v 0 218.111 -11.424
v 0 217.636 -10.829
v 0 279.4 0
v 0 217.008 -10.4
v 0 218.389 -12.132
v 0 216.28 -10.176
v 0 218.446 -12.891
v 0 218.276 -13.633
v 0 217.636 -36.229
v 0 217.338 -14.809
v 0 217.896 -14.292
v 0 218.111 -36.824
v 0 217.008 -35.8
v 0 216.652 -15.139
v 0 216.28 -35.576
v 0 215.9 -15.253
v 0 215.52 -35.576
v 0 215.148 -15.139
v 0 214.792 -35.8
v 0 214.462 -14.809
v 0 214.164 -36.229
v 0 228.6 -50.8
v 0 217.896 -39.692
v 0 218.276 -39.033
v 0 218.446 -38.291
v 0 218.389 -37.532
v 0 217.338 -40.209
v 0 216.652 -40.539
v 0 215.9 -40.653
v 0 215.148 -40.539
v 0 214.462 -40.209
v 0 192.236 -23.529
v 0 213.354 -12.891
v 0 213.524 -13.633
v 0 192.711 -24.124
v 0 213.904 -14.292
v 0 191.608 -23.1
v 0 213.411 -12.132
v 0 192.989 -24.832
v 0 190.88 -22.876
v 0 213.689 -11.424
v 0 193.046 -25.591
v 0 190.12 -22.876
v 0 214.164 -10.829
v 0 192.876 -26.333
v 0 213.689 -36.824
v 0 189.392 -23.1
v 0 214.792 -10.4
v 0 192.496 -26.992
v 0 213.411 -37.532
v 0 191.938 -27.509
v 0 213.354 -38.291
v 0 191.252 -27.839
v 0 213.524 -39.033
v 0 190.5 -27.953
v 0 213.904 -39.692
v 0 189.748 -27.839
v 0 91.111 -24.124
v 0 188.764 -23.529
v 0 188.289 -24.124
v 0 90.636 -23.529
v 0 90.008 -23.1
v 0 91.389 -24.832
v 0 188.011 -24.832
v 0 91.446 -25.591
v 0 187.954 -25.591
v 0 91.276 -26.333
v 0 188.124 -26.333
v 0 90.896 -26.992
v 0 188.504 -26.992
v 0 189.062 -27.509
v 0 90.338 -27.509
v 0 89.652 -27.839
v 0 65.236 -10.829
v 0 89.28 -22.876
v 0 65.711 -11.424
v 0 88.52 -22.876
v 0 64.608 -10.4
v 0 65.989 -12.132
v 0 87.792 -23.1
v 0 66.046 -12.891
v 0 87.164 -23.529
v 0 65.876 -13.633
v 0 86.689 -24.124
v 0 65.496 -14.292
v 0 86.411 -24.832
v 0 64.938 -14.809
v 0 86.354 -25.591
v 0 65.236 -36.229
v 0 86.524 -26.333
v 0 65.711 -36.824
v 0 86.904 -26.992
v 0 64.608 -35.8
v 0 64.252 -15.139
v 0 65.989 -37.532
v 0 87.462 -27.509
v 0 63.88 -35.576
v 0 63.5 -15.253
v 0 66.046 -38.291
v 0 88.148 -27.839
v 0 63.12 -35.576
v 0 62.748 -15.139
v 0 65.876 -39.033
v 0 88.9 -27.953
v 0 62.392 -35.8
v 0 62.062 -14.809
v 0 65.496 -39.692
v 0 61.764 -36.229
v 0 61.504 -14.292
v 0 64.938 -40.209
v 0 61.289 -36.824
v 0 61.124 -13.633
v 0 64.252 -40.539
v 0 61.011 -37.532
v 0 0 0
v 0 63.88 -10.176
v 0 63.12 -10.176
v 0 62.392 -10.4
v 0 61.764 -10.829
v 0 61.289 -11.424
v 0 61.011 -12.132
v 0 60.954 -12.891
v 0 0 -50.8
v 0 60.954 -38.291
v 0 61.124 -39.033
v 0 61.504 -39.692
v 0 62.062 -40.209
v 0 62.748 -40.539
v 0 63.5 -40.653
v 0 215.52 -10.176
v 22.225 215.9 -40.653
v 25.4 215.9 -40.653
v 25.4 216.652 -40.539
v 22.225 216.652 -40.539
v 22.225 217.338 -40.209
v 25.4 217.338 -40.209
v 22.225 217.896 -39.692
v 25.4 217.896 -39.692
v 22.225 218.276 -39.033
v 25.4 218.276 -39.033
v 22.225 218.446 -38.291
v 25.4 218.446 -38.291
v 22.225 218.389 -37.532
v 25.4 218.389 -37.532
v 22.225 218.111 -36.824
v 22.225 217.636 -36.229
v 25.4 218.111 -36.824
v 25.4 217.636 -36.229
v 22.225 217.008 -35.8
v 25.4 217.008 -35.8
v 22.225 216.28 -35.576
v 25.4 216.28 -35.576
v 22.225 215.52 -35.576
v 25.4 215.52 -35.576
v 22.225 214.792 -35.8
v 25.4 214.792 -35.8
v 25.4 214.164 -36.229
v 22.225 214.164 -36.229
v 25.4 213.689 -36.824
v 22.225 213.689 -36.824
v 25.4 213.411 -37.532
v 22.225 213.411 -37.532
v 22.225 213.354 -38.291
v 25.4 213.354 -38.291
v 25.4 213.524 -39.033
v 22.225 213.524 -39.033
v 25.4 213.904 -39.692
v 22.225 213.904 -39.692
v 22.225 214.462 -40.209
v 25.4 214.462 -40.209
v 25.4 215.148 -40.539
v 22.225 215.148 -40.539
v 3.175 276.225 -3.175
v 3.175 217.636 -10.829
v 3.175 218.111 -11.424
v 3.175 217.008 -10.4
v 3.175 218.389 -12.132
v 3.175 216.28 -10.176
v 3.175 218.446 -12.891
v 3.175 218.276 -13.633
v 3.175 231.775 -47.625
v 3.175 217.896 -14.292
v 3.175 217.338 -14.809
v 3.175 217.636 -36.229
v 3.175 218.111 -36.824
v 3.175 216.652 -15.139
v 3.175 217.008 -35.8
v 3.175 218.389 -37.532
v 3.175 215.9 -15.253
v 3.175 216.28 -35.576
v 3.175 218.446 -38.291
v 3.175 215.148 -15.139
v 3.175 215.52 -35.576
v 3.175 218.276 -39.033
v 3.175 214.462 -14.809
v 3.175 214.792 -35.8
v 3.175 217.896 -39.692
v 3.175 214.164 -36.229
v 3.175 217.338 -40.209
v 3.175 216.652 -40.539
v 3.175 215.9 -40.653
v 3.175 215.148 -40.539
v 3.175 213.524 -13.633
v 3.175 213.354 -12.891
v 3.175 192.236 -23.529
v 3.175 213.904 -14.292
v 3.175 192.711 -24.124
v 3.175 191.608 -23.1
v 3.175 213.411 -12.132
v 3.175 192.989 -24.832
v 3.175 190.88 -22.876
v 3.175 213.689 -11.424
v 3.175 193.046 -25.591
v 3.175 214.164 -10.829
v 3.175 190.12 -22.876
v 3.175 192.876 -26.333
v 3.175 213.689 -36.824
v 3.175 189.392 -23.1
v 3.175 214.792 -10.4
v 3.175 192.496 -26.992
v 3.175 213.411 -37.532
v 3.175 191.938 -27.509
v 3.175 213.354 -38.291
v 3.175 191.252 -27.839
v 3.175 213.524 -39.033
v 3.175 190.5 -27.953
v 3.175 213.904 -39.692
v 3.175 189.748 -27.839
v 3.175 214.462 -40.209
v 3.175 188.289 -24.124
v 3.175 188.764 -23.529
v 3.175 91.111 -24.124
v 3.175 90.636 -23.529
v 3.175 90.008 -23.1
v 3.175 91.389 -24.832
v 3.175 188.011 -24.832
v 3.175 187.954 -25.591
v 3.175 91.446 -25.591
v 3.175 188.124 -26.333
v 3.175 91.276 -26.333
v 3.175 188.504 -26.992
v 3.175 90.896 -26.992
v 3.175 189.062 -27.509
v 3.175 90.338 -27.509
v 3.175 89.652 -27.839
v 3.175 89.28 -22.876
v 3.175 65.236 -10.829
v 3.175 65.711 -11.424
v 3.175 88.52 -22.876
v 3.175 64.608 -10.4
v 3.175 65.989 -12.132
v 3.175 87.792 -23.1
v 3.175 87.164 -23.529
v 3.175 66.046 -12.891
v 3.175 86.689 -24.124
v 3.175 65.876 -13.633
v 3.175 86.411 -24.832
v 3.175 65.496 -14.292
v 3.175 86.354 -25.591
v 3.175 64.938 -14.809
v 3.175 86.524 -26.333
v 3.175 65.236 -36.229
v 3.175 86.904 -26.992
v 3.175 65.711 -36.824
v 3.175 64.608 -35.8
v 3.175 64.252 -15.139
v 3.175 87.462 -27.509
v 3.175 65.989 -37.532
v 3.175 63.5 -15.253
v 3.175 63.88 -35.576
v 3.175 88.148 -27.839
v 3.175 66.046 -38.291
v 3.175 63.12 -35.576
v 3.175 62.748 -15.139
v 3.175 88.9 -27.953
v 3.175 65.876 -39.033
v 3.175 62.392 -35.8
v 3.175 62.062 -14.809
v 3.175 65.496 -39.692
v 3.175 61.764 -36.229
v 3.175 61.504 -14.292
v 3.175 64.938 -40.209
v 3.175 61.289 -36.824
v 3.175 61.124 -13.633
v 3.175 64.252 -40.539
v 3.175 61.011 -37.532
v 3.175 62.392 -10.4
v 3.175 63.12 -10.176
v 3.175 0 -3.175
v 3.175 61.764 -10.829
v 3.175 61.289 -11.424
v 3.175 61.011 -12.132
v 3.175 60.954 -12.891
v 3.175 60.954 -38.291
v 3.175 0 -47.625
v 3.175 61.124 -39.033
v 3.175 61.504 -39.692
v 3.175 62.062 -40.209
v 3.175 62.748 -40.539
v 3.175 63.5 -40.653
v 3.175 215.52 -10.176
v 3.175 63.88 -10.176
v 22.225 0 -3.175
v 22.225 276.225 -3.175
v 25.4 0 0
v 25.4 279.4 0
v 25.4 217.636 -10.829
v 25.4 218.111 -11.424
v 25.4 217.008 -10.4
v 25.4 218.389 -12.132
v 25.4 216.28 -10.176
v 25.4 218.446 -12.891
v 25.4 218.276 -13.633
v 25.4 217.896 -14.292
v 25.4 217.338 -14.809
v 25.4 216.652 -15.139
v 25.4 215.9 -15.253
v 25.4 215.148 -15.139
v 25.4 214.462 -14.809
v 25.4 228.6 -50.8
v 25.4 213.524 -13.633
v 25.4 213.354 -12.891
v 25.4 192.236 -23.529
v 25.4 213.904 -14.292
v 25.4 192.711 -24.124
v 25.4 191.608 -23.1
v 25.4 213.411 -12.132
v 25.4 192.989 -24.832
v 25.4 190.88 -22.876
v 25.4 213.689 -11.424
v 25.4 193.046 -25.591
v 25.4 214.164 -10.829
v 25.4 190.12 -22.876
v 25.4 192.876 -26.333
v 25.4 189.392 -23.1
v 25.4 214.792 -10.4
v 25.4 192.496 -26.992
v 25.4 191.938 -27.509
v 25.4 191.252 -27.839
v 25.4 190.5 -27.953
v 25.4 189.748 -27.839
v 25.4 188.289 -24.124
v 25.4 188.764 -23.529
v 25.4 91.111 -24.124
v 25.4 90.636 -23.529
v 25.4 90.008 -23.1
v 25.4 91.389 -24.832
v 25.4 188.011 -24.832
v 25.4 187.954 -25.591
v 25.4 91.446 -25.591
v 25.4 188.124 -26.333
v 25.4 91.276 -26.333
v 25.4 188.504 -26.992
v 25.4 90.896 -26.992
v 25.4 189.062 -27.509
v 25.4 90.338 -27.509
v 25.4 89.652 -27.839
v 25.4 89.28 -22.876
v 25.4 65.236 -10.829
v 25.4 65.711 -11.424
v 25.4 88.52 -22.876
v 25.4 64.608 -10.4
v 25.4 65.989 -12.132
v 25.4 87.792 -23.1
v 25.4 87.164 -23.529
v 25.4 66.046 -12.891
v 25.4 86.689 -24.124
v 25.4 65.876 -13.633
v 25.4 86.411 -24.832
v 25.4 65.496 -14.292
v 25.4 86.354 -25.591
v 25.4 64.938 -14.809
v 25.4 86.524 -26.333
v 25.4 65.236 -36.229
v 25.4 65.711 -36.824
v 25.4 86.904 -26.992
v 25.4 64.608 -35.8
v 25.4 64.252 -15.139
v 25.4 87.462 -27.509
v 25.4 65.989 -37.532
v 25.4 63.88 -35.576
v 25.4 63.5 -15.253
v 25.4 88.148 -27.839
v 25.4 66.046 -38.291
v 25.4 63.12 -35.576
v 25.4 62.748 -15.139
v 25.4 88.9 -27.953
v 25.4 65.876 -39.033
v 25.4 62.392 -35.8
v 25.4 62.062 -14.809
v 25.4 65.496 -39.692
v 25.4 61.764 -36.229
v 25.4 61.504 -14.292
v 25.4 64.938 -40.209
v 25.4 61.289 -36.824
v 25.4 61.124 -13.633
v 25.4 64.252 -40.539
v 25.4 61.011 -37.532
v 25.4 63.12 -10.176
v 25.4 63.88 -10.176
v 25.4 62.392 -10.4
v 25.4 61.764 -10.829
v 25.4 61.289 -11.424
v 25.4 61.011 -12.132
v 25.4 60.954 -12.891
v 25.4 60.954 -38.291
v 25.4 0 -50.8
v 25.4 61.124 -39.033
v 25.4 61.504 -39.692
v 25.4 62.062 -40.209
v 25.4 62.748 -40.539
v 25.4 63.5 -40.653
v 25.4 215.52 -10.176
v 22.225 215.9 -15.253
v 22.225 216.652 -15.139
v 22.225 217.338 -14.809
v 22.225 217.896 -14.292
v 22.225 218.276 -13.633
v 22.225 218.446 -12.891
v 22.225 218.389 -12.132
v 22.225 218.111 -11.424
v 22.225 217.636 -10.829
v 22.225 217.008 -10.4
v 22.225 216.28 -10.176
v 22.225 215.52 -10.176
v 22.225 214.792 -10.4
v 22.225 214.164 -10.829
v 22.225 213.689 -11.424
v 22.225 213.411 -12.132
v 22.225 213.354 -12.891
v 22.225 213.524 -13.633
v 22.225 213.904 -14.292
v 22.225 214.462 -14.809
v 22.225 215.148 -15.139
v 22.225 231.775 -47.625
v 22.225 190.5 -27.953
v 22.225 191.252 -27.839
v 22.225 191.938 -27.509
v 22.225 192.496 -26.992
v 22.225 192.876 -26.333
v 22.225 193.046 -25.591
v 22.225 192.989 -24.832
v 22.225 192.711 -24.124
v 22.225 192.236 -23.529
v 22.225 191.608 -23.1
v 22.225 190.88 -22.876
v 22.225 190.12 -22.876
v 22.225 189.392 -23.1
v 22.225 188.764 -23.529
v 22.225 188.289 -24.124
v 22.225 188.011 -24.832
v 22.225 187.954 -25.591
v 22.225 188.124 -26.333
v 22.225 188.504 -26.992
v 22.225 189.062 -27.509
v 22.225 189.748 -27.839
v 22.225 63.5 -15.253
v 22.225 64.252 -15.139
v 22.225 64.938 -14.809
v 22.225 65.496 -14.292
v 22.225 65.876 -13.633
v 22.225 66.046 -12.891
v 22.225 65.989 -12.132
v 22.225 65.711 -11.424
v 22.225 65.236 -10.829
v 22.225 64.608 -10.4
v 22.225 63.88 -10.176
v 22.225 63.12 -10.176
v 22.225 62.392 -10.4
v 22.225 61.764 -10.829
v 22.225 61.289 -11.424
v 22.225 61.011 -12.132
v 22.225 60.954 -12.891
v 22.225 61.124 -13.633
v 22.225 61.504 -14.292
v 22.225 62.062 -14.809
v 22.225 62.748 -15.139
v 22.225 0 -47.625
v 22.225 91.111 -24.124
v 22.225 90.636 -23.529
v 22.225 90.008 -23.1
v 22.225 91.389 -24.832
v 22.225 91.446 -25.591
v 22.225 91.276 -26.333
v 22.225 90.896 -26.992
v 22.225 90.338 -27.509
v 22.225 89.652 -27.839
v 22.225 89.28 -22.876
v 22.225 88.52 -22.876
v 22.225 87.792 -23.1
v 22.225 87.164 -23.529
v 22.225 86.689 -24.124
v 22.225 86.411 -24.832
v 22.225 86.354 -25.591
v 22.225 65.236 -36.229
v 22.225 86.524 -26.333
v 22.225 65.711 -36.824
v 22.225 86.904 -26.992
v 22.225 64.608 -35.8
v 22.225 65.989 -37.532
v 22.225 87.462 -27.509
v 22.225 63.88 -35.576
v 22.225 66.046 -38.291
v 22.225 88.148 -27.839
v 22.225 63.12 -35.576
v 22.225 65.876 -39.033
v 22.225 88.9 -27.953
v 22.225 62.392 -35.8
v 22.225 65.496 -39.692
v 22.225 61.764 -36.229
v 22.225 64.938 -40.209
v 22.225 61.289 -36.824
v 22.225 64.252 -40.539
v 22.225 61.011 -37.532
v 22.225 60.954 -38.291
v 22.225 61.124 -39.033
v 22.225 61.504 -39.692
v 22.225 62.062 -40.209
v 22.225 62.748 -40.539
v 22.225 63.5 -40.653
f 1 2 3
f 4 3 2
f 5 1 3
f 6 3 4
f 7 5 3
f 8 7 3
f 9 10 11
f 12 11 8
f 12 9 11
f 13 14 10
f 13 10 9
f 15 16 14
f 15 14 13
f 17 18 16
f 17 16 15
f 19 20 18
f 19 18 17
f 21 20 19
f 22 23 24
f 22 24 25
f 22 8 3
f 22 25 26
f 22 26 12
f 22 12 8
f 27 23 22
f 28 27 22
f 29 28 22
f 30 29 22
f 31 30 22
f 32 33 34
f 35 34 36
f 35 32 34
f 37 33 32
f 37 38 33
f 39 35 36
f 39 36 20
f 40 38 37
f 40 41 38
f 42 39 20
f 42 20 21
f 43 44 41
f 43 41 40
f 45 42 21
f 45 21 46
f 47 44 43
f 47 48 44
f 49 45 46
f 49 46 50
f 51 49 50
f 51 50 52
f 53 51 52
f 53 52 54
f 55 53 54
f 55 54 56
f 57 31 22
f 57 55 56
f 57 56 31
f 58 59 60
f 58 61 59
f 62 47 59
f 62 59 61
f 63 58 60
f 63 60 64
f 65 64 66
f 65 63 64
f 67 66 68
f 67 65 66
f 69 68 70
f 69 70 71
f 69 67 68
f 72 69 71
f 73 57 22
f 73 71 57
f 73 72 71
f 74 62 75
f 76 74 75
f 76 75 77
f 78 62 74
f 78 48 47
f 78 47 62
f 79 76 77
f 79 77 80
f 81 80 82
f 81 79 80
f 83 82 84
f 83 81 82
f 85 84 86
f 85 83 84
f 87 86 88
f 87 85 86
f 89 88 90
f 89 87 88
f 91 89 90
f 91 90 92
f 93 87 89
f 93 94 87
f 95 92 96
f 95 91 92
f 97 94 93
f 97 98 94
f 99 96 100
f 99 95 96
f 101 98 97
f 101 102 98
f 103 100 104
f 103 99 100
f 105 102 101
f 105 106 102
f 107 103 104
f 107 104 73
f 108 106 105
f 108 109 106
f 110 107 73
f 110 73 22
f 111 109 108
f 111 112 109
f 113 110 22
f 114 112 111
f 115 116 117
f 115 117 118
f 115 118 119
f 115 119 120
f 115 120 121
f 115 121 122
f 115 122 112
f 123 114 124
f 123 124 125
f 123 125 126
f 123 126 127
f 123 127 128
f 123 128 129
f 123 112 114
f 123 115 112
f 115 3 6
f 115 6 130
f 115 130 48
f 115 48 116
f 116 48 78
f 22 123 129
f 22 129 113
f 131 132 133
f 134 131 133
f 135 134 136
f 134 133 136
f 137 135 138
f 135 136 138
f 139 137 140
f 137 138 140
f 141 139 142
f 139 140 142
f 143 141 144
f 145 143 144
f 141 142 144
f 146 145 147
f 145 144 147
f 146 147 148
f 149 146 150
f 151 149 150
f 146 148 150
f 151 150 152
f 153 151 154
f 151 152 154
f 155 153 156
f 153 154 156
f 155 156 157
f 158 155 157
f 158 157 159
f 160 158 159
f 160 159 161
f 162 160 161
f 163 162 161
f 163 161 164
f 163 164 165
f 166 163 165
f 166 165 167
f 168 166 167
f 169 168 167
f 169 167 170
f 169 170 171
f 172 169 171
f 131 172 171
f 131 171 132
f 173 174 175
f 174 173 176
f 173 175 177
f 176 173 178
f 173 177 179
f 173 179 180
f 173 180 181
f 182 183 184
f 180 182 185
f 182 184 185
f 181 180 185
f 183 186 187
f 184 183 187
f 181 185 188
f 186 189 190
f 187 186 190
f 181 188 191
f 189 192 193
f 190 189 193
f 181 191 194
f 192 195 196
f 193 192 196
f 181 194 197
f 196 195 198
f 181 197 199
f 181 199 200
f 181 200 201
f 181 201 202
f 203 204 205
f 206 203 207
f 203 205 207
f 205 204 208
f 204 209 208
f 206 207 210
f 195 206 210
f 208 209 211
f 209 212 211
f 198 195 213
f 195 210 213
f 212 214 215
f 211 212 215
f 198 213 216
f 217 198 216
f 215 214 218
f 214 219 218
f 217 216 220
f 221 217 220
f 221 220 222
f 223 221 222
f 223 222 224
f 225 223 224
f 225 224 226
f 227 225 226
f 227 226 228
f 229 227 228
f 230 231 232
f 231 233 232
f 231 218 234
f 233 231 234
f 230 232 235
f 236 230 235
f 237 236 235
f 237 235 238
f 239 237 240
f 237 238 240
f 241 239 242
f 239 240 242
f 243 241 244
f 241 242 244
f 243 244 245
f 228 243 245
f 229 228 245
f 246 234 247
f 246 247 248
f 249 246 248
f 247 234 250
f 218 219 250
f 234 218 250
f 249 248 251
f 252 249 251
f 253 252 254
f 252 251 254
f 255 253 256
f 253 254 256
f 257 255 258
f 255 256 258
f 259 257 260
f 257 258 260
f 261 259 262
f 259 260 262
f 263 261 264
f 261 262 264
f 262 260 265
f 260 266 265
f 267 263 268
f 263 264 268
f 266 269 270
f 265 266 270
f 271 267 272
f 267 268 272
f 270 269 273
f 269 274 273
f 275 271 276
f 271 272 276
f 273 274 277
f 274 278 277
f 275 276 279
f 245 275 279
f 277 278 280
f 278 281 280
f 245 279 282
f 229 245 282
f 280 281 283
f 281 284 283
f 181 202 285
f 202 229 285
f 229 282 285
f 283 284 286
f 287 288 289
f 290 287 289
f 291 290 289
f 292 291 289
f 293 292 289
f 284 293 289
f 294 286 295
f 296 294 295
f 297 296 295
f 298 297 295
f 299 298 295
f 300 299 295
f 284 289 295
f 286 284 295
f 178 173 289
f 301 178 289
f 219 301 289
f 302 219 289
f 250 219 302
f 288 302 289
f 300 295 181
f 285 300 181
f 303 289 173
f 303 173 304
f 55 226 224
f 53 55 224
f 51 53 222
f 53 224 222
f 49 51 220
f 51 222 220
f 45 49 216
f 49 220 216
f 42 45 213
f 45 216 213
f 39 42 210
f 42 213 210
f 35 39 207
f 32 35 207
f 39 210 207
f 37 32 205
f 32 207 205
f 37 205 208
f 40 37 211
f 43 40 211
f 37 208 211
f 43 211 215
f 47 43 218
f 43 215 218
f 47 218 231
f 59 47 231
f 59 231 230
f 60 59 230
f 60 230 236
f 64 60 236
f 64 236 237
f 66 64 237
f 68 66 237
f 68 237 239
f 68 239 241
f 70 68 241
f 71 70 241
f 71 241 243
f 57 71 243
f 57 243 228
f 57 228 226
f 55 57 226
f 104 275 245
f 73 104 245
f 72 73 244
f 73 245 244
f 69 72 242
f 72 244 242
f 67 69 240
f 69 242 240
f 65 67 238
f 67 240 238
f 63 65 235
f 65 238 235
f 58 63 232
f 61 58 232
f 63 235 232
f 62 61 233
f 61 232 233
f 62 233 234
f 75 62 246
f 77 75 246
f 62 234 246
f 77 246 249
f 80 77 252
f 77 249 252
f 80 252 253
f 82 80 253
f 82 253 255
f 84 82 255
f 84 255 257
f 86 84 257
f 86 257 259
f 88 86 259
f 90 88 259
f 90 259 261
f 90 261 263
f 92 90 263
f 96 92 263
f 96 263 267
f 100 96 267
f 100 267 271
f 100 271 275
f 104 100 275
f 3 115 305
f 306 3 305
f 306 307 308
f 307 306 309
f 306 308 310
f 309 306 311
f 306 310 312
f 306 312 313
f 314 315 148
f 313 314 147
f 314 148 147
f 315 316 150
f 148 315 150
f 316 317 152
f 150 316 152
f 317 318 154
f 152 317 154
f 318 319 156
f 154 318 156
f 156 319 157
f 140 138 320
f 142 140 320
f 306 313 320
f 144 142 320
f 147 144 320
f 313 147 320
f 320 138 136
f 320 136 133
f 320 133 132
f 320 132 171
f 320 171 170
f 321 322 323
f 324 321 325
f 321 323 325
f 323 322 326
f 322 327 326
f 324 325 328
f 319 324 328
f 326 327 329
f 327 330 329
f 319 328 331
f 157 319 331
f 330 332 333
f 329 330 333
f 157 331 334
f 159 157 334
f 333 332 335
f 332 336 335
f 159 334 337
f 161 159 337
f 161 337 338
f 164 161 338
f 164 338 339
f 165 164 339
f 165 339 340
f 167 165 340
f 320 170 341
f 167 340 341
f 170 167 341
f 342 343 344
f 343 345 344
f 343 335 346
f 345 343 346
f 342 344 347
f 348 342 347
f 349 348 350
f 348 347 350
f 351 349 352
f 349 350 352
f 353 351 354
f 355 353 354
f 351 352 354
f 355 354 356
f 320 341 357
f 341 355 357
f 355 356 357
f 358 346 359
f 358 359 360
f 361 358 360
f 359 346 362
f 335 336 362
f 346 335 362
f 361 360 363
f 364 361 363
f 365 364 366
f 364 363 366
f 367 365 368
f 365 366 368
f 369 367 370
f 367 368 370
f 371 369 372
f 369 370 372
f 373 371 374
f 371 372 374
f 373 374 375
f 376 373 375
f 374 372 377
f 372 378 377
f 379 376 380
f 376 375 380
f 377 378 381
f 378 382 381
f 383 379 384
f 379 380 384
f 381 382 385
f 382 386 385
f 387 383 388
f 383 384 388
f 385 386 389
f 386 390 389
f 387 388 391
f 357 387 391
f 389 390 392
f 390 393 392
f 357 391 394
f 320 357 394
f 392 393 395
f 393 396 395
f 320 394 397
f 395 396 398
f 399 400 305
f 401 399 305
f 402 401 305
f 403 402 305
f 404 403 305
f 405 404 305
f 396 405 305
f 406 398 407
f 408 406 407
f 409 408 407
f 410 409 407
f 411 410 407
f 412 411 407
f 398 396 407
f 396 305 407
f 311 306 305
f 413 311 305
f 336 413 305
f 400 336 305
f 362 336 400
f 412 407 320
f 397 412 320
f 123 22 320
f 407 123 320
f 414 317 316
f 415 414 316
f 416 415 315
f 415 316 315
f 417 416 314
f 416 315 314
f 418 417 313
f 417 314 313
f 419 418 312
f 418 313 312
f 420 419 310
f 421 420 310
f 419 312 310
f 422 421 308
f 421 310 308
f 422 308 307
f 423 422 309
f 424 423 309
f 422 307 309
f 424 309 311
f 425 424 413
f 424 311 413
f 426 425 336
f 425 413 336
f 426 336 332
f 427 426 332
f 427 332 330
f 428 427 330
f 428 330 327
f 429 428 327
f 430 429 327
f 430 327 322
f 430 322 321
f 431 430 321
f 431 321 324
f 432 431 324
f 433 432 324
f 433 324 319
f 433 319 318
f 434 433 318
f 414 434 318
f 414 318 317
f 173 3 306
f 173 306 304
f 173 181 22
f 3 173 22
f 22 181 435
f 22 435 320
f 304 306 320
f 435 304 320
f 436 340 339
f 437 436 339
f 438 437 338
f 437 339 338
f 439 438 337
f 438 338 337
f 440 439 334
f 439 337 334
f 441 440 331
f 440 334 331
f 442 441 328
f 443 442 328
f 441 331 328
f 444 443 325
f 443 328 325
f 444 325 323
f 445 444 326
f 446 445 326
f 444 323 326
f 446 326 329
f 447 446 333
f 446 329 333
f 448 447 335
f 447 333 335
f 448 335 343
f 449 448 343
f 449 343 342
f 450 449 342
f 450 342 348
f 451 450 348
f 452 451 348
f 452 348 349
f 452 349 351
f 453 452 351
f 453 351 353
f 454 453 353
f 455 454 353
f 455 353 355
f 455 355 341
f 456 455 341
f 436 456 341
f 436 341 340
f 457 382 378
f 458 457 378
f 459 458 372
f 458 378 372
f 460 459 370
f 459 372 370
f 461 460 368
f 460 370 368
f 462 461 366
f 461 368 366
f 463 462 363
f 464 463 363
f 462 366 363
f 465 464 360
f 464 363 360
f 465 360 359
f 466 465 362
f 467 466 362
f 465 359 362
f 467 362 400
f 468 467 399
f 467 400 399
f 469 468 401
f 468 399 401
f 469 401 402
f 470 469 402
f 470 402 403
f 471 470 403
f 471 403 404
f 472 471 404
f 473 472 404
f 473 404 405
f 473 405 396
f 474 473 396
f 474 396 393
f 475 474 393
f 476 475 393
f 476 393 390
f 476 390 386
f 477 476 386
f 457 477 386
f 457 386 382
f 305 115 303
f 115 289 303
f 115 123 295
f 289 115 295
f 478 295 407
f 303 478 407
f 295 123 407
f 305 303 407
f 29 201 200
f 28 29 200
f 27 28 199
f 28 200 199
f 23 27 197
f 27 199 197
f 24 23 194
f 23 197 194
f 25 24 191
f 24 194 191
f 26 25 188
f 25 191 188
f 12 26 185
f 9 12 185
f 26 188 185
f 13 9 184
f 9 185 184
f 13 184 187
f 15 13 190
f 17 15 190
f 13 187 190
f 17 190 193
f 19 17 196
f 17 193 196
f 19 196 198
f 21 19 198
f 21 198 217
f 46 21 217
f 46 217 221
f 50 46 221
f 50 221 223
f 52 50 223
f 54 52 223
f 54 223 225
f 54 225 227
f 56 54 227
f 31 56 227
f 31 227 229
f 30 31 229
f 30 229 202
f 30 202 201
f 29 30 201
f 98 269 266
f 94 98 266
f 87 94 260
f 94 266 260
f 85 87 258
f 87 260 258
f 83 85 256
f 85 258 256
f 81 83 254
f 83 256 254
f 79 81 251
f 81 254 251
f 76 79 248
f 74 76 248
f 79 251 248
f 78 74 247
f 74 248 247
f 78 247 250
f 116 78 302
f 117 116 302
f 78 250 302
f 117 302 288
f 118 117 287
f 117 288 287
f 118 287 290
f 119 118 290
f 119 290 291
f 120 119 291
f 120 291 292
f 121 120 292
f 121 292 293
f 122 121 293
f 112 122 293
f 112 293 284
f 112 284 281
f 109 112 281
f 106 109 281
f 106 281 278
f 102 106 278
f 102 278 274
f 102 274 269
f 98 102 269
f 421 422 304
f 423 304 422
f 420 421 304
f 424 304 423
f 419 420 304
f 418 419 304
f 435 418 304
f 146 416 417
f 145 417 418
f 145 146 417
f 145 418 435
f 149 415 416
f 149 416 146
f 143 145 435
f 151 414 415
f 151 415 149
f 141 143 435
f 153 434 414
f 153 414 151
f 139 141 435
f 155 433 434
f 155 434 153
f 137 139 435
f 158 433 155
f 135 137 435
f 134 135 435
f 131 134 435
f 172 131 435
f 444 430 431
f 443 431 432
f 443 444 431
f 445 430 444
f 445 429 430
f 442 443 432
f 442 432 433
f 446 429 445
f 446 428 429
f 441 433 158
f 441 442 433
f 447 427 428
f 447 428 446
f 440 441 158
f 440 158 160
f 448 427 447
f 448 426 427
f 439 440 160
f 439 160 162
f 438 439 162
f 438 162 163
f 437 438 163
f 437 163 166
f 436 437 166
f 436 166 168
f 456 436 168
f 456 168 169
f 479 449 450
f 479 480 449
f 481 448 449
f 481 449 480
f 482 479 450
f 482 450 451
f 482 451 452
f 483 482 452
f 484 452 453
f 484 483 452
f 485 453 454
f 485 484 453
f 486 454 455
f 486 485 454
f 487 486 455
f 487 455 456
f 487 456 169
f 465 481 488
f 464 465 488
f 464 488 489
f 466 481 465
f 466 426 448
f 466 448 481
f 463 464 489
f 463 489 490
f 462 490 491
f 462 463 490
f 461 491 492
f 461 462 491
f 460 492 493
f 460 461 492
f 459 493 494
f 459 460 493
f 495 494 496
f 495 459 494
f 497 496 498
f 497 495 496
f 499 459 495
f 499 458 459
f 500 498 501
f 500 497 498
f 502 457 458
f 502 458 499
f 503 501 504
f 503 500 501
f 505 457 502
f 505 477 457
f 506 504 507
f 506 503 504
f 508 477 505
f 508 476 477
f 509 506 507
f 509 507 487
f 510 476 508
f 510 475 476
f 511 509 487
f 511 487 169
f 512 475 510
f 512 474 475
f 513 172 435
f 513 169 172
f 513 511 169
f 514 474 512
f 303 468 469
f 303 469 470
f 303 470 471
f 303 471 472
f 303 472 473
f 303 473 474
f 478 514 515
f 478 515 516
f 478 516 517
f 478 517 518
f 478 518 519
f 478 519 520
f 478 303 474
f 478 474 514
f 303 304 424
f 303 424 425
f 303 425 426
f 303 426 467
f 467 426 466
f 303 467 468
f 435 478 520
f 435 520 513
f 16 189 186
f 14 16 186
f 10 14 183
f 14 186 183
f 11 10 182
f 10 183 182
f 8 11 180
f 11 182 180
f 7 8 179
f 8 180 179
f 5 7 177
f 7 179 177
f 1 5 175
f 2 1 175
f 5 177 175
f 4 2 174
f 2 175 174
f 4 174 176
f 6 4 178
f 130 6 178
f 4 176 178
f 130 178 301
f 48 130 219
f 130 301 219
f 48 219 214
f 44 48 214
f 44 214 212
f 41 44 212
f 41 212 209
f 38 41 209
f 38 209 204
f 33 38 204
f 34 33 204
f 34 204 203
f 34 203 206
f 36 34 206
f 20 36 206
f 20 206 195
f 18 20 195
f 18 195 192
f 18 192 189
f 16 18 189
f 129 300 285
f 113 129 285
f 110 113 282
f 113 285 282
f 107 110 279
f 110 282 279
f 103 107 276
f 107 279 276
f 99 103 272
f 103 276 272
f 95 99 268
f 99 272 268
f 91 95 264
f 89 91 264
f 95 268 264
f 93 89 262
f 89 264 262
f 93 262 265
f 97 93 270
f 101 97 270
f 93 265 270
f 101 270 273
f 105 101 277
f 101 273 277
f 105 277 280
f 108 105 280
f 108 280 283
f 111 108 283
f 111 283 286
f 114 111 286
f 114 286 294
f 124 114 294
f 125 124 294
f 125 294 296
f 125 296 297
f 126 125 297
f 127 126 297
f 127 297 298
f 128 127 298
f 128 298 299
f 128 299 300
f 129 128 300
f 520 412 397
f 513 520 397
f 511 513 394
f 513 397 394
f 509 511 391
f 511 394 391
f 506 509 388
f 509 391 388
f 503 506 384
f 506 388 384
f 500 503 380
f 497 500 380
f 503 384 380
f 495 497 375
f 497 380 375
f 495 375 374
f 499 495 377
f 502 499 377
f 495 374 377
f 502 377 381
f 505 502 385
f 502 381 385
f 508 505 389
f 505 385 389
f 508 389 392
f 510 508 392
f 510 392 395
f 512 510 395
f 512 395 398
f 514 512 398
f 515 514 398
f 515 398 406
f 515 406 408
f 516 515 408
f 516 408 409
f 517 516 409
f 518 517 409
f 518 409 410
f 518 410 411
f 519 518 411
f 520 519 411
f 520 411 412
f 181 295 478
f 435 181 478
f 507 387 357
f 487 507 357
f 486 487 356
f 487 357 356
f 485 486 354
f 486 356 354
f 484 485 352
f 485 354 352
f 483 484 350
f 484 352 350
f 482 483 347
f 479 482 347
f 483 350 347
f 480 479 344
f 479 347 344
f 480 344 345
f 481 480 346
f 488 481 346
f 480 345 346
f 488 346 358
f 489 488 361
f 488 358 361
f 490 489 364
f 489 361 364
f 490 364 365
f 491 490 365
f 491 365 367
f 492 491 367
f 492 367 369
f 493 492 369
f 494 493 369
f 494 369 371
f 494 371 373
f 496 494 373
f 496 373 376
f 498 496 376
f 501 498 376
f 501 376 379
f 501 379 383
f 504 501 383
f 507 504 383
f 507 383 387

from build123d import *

# Parameters (mm, degrees)
SKETCH1_W           = 25.4
SKETCH1_H           = 50.8
SKETCH1_W_2         = 19.05
SKETCH1_H_2         = 44.45
BOSS_EXTRUDE1_DEPTH = 279.4
CUT_EXTRUDE1_DEPTH  = 279.4
SKETCH3_R           = 2.5527
CUT_EXTRUDE2_DEPTH  = 25.4


with BuildPart() as part:
    # Sketch1 → Boss-Extrude1 (new body)
    with BuildSketch(Plane(origin=(0, 0, 0), x_dir=(1, 0, 0), z_dir=(0, 1, 0))):
        with Locations((12.7, 25.4)):
            Rectangle(SKETCH1_W, SKETCH1_H)
        with Locations((12.7, 25.4)):
            Rectangle(SKETCH1_W_2, SKETCH1_H_2, mode=Mode.SUBTRACT)
    extrude(amount=BOSS_EXTRUDE1_DEPTH)

    # Sketch2 → Cut-Extrude1 (cut)
    with BuildSketch(Plane(origin=(25.4, 0, 0), x_dir=(0, 0, -1), z_dir=(1, 0, 0))):
        Polygon((0, 279.4), (50.8, 228.6), (50.8, 279.4), align=None)
    extrude(amount=-CUT_EXTRUDE1_DEPTH, mode=Mode.SUBTRACT)

    # Sketch3 → Cut-Extrude2 (cut)
    with BuildSketch(Plane(origin=(25.4, 0, 0), x_dir=(0, 0, -1), z_dir=(1, 0, 0))):
        with Locations((12.7, 215.9)):
            Circle(SKETCH3_R)
        with Locations((38.1, 215.9)):
            Circle(SKETCH3_R)
        with Locations((25.4, 190.5)):
            Circle(SKETCH3_R)
        with Locations((12.7, 63.5)):
            Circle(SKETCH3_R)
        with Locations((38.1, 63.5)):
            Circle(SKETCH3_R)
        with Locations((25.4, 88.9)):
            Circle(SKETCH3_R)
    extrude(amount=-CUT_EXTRUDE2_DEPTH, mode=Mode.SUBTRACT)


solid = part.part
